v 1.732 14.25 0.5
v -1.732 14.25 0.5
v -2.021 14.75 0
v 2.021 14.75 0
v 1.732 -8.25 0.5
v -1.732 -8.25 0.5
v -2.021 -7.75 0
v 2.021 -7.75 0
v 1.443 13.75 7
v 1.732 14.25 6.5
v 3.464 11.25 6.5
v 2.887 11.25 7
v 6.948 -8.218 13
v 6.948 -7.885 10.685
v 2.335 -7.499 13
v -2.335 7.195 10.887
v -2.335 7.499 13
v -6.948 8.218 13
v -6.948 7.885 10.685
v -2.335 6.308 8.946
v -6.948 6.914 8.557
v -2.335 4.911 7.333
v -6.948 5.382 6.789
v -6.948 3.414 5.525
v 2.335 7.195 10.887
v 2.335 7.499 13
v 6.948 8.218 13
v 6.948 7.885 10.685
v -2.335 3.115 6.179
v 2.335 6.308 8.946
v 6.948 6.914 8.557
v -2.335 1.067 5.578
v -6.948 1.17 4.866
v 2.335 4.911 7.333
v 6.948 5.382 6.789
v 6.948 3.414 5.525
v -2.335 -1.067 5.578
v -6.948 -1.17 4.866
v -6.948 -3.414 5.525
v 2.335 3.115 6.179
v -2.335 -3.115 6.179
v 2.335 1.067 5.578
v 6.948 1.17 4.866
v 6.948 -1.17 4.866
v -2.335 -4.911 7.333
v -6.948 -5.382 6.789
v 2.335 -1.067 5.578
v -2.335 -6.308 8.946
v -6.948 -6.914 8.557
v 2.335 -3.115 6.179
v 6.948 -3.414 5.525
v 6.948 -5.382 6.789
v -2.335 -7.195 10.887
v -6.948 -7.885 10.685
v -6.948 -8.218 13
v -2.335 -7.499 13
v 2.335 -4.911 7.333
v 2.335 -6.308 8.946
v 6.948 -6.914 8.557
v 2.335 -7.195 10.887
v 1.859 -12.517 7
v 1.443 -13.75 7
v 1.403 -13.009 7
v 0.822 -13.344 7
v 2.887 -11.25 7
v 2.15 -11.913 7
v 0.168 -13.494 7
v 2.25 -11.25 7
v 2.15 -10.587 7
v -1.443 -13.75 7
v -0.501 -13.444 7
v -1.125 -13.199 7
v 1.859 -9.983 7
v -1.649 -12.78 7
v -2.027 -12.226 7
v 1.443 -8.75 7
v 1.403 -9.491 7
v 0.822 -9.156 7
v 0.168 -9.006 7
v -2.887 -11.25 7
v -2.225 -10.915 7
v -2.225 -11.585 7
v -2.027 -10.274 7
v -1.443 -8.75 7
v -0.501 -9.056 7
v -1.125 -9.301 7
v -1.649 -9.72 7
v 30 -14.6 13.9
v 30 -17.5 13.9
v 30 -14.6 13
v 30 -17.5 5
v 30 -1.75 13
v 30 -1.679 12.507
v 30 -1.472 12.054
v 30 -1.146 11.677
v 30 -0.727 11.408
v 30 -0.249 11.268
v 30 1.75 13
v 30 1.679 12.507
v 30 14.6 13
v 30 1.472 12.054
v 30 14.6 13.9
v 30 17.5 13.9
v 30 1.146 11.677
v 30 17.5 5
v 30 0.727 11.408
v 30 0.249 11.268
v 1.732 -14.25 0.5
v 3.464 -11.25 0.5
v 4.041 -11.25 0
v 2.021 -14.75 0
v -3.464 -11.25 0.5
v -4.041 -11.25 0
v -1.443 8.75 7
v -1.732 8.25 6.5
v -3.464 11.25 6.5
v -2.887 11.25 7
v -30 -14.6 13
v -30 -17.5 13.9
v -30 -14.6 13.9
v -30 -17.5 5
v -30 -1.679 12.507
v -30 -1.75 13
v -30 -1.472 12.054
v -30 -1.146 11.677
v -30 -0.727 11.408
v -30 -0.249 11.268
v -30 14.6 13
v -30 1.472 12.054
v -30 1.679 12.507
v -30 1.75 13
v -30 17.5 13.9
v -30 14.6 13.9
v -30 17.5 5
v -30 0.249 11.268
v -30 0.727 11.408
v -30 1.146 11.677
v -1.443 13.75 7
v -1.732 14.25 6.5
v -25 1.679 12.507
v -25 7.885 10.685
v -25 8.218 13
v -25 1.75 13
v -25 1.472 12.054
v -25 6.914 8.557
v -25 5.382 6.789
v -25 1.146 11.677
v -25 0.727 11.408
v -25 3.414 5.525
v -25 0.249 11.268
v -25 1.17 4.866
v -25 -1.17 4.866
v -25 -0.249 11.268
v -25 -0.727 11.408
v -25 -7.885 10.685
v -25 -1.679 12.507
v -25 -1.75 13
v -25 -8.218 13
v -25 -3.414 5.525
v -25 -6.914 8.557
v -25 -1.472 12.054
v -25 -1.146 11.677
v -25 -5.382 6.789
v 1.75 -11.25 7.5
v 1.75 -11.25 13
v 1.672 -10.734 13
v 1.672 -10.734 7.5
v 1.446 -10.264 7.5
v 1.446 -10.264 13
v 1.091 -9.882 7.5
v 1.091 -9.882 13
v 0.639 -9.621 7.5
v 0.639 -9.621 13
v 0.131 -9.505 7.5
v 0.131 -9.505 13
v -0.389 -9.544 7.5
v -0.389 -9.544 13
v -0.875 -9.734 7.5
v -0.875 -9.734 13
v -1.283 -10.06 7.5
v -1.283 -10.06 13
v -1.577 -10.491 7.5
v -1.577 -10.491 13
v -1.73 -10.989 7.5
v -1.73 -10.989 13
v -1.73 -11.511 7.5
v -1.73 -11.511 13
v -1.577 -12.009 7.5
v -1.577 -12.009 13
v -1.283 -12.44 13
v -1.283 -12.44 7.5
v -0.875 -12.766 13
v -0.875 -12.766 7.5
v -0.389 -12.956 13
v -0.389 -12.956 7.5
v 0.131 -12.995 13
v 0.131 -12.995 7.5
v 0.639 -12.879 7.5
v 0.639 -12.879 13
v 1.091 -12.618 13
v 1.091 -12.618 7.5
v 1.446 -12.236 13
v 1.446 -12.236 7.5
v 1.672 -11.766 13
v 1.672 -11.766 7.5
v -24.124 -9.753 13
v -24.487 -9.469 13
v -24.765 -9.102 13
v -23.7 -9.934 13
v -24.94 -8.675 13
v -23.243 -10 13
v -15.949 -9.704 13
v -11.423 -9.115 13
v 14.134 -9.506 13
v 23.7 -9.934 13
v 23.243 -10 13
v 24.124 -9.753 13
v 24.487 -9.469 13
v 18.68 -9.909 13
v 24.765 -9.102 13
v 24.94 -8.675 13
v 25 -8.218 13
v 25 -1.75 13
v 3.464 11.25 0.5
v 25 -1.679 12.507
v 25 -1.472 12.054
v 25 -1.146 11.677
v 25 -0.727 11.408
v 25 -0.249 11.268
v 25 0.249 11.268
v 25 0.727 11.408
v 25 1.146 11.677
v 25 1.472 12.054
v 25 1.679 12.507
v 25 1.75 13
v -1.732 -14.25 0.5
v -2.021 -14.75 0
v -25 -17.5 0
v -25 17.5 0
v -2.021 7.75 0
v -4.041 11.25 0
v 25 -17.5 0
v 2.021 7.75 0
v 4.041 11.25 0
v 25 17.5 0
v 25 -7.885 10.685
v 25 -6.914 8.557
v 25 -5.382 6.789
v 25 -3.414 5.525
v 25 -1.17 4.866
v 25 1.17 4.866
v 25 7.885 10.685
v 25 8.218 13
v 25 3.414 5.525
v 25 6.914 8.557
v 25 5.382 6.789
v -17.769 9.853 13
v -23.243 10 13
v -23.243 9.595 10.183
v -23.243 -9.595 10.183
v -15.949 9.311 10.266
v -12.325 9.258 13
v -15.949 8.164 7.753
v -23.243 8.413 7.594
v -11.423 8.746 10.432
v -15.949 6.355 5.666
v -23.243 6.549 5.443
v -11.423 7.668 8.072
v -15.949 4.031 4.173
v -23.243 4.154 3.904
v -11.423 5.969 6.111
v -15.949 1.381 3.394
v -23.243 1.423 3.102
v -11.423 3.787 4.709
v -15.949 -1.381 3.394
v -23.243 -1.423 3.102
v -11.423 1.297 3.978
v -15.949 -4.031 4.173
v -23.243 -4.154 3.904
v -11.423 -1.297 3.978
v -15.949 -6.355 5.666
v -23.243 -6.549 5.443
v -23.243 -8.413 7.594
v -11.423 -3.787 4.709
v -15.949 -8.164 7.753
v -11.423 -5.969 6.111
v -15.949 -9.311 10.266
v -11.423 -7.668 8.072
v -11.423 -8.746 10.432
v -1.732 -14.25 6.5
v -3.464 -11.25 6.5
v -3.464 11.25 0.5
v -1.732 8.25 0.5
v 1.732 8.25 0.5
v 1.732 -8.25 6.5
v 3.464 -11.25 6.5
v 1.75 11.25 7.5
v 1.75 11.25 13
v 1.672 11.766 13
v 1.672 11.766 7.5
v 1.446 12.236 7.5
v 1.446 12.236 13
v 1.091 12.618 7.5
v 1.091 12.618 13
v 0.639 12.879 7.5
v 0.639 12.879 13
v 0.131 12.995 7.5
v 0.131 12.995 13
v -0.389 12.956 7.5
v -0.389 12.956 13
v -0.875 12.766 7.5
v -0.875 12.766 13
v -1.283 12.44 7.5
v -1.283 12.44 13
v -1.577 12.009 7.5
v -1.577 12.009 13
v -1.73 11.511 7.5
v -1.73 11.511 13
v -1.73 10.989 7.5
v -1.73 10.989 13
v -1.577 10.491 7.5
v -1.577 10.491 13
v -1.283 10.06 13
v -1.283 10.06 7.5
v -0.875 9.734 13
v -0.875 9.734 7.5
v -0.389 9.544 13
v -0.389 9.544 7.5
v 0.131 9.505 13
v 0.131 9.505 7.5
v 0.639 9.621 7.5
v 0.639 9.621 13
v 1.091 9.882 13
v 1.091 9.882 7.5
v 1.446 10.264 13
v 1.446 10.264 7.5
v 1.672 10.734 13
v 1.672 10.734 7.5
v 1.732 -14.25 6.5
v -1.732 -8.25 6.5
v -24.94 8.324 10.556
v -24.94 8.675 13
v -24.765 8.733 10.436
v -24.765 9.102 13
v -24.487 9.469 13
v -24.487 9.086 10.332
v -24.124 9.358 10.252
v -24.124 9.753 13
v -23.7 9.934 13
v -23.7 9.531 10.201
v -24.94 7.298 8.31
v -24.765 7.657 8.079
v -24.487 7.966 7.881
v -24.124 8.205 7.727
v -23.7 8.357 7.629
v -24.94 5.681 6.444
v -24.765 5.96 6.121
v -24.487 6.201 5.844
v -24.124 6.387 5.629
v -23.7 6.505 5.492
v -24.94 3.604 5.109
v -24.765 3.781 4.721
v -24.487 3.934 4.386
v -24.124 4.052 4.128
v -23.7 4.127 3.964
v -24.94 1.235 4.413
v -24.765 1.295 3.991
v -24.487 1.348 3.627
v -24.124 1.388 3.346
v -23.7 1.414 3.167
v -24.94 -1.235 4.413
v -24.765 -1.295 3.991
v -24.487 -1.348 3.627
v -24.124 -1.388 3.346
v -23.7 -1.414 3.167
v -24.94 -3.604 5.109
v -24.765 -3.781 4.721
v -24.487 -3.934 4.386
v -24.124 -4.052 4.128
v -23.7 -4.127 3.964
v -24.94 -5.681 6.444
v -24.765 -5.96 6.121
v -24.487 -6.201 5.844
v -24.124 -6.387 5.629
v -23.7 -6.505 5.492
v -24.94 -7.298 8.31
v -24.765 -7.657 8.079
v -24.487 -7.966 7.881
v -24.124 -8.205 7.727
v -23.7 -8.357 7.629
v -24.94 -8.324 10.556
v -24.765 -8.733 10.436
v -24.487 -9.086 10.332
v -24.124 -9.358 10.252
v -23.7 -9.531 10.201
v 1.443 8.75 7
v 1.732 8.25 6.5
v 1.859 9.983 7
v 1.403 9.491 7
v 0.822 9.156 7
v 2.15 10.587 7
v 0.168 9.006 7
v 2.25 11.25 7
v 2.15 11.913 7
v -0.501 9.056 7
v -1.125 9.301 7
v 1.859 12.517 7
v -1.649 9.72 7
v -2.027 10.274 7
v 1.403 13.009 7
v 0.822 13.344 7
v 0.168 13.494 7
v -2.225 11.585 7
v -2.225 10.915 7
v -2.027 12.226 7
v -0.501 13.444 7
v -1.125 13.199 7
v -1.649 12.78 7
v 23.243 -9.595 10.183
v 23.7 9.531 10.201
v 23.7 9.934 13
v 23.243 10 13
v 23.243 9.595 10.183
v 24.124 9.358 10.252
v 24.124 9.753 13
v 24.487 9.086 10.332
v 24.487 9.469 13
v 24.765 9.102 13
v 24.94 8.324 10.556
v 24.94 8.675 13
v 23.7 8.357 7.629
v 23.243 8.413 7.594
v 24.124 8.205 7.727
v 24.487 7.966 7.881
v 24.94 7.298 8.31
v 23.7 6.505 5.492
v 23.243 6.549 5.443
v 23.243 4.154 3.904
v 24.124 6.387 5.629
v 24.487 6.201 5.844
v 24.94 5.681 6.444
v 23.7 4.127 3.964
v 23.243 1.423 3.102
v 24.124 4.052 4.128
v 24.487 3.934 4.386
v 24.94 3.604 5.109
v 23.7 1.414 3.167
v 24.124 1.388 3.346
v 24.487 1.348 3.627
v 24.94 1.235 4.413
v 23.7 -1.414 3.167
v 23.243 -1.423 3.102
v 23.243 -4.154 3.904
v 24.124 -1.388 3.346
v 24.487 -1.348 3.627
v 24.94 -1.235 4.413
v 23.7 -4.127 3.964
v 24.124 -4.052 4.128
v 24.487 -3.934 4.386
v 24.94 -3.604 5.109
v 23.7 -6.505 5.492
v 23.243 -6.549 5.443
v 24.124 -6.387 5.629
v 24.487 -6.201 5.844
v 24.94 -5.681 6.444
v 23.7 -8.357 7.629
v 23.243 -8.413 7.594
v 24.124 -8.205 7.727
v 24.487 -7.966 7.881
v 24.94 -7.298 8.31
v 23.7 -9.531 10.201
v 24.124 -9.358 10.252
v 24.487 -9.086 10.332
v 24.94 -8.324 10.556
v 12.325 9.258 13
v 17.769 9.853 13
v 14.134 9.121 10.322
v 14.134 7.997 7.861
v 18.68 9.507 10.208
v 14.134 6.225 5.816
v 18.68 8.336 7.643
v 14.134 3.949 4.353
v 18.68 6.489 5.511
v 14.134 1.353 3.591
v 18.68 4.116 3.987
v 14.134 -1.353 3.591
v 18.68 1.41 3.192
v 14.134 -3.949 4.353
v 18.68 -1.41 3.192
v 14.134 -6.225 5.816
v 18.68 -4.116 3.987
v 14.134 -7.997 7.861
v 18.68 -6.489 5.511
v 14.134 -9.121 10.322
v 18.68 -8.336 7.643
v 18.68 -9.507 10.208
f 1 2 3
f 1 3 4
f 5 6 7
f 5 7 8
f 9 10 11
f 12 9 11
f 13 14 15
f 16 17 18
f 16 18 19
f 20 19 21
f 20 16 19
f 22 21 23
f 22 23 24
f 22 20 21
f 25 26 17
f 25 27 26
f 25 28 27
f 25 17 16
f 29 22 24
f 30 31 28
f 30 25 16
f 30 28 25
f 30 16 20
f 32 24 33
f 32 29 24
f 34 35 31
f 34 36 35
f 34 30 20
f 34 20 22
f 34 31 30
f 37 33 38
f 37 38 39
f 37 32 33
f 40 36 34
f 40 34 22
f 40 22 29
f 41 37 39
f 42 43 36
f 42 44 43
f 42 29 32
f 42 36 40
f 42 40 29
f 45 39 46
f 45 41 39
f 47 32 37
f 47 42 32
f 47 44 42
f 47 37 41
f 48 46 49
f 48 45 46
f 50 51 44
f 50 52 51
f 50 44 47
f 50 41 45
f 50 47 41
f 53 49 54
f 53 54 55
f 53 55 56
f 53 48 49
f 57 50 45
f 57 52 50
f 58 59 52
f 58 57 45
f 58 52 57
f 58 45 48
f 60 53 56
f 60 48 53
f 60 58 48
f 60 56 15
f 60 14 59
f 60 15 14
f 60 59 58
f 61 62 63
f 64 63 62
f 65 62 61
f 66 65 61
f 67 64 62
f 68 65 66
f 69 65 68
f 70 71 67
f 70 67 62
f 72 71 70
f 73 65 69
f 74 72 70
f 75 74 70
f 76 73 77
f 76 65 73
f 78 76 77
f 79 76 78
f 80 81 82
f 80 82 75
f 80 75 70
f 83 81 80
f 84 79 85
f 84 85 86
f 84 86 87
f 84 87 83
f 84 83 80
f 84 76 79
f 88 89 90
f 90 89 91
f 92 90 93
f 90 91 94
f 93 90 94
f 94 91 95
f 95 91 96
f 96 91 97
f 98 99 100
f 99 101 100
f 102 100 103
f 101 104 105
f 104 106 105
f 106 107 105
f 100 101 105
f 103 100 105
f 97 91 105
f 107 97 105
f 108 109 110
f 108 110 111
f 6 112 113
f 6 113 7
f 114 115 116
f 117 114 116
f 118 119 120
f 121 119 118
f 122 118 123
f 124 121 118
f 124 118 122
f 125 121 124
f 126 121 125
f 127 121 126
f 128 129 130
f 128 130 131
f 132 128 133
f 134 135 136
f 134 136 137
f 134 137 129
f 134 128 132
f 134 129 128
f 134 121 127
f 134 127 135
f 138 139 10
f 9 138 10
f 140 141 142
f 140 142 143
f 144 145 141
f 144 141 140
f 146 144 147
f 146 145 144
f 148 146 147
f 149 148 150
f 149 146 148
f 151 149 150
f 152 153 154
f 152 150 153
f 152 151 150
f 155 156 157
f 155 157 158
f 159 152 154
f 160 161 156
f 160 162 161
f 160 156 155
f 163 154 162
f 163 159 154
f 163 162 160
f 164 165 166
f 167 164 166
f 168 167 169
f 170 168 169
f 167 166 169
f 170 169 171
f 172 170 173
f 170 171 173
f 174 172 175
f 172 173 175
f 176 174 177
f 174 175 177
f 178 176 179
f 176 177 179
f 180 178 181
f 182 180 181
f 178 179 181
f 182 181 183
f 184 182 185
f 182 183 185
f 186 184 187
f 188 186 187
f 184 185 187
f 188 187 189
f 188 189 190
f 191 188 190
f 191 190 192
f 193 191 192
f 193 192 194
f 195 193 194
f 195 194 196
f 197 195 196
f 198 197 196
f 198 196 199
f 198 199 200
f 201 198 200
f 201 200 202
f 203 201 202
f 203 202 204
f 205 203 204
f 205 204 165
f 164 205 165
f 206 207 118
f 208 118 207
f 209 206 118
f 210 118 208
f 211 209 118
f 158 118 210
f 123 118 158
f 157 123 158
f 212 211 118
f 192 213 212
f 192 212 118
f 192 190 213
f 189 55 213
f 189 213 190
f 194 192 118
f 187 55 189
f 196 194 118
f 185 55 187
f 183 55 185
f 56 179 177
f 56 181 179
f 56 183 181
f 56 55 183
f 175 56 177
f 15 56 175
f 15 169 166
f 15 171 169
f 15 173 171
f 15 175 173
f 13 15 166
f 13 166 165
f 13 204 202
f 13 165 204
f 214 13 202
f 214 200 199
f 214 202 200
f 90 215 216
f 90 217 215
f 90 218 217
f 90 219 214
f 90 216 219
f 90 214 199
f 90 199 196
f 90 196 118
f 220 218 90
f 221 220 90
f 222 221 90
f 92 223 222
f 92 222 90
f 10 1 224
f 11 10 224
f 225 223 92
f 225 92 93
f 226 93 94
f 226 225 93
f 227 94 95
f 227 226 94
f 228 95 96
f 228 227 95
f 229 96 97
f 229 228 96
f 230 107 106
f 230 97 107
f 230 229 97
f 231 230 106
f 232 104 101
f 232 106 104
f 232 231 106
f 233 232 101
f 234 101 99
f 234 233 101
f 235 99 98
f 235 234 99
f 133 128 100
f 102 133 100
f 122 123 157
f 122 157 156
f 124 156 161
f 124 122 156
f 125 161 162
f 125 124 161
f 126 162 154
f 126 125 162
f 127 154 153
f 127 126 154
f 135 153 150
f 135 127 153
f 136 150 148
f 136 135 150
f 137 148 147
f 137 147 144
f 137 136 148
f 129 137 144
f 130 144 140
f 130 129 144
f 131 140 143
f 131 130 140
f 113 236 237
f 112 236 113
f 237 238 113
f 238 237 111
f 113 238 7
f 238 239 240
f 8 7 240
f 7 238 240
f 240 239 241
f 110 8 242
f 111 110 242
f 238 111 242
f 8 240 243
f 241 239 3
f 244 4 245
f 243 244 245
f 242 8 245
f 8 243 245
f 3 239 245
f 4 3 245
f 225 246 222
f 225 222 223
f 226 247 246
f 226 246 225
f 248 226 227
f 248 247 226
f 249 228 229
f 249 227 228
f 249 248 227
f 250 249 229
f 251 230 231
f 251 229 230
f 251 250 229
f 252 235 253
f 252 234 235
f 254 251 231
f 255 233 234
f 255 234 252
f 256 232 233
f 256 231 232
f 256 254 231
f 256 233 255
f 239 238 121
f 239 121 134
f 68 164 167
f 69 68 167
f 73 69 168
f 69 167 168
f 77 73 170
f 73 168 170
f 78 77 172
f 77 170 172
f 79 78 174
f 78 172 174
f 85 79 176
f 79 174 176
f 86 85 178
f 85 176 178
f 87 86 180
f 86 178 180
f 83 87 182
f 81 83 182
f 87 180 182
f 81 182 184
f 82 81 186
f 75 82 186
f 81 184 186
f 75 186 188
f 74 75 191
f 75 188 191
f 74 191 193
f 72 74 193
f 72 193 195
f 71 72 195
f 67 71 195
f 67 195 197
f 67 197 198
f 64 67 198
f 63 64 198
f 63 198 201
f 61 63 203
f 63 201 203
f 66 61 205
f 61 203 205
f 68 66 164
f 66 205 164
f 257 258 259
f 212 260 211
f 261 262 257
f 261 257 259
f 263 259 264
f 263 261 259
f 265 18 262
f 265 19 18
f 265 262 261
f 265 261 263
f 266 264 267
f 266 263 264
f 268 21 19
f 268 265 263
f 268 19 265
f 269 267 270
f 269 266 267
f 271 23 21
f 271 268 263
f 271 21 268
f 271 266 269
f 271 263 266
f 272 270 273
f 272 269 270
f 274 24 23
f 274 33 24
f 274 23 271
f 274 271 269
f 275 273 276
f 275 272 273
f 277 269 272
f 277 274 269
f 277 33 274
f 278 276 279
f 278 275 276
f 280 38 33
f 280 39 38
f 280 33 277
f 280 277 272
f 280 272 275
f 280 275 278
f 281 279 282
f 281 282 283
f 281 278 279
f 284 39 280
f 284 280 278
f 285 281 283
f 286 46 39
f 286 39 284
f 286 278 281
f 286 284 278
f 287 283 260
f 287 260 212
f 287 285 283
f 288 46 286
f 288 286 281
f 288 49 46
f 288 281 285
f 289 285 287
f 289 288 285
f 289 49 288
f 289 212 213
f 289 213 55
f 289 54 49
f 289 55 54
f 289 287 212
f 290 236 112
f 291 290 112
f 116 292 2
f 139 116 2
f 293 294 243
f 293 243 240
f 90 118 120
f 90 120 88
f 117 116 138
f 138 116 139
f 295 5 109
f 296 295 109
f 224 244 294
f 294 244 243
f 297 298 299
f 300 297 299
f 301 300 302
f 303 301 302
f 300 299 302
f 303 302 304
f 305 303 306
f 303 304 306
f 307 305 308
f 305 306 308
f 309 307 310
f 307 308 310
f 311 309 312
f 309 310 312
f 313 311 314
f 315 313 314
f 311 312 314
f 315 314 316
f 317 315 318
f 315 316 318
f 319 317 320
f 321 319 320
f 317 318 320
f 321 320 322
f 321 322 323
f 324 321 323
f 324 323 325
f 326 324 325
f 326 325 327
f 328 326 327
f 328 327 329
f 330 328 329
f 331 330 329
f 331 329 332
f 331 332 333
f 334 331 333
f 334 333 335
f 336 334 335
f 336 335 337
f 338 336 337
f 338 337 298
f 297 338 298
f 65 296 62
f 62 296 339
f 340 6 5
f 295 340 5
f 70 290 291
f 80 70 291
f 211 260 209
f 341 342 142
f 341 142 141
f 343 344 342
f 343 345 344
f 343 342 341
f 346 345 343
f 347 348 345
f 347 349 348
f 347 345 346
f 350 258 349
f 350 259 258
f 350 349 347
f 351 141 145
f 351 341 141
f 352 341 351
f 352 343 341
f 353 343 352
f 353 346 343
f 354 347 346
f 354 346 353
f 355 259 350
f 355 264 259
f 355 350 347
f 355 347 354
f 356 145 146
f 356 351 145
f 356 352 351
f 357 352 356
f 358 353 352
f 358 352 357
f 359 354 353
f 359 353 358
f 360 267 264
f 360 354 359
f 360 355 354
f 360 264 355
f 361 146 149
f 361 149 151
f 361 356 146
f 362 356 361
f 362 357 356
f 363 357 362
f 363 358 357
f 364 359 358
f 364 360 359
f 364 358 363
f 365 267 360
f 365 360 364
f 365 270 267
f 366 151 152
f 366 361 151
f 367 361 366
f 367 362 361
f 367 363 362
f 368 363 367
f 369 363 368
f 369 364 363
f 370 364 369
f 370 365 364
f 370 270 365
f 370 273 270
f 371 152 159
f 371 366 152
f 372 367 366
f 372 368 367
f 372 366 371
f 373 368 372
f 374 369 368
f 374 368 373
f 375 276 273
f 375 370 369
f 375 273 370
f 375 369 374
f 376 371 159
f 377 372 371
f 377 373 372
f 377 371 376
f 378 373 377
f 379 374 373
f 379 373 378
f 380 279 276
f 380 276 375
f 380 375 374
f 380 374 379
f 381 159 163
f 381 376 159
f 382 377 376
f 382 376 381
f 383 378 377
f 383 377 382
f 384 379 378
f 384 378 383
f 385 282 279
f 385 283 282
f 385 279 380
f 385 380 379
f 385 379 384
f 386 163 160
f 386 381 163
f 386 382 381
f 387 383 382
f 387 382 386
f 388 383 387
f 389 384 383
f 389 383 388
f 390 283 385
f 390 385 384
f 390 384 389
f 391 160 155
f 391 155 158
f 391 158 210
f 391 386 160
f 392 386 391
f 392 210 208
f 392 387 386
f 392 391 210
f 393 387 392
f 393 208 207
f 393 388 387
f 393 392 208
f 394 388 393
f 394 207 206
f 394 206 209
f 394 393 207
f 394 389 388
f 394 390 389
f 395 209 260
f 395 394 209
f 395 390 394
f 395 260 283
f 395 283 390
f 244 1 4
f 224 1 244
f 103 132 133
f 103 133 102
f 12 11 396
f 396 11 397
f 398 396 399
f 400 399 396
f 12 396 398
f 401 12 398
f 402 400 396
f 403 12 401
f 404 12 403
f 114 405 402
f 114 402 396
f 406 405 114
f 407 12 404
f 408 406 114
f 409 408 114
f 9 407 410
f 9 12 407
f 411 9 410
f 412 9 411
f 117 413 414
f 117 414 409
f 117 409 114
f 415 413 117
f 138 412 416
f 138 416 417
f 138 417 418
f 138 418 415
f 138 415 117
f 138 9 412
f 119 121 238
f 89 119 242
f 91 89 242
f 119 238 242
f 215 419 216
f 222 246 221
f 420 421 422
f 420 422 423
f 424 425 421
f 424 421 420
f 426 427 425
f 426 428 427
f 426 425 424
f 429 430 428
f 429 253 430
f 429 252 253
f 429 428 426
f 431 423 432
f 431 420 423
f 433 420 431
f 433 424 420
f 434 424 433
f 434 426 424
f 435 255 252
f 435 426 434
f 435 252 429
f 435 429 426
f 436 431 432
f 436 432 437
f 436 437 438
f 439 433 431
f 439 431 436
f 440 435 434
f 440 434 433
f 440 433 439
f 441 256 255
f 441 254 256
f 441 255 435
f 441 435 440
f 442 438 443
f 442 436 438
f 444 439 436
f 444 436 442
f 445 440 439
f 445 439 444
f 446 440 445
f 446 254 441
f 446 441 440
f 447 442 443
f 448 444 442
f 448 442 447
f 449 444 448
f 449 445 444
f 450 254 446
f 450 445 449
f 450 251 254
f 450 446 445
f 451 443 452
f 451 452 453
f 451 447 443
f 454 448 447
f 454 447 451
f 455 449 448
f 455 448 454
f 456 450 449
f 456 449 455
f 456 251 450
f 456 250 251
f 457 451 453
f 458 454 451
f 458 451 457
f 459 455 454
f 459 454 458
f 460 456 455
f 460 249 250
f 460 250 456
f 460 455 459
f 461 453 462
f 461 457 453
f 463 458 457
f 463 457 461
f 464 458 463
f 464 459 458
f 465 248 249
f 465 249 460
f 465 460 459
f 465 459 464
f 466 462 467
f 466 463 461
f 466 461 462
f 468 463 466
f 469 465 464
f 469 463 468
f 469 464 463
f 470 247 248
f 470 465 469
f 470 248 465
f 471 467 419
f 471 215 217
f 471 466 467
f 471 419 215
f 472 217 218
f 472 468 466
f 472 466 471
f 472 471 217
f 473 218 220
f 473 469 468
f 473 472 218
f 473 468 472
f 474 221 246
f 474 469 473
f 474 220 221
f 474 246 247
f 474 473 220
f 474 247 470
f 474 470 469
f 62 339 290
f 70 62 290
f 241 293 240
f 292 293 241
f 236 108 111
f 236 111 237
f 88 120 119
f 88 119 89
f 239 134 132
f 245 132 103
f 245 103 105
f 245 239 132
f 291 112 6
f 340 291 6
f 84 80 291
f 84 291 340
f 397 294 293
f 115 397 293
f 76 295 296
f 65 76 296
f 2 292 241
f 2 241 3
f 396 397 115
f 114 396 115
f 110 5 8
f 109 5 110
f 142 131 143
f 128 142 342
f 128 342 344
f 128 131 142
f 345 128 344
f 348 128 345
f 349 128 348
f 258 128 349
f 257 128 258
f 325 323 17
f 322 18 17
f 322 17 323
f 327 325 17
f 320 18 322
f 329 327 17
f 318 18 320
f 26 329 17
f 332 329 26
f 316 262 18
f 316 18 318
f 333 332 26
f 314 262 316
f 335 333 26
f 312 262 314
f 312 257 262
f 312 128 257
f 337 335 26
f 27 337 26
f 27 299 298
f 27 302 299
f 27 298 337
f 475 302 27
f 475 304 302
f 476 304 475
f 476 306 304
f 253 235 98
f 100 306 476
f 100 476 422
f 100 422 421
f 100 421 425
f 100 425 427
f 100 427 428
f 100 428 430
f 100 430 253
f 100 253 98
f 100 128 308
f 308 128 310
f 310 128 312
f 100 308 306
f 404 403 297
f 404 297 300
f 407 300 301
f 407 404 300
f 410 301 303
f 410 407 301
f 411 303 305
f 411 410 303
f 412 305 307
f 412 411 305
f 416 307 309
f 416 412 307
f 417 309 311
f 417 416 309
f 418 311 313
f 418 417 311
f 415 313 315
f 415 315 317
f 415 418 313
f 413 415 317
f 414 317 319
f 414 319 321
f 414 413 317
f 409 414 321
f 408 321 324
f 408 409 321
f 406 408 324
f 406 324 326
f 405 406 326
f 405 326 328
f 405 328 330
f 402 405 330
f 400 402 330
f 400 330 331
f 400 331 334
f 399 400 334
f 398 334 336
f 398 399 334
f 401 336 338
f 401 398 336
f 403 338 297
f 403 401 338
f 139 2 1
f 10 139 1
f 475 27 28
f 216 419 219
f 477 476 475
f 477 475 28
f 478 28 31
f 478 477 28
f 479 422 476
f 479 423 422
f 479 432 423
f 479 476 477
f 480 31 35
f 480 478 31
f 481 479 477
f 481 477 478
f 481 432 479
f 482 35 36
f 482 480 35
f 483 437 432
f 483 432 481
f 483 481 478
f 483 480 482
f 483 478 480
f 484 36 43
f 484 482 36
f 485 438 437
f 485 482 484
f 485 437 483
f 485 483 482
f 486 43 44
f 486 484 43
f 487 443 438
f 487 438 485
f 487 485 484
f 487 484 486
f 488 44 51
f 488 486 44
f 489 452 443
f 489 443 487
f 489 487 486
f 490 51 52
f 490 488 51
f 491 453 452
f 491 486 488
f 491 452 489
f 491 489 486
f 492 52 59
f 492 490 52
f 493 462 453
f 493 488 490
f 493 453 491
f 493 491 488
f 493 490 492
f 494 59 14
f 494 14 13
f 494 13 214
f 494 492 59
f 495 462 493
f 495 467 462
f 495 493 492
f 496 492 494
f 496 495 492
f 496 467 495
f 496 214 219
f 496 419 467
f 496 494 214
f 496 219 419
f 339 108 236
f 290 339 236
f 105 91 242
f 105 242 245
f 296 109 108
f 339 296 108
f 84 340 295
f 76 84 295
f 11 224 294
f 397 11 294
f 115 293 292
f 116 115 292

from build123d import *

# Parameters (mm, degrees)
SKETCH1_W               = 60
SKETCH1_H               = 35
BOSS_EXTRUDE1_DEPTH     = 13
CUT_EXTRUDE1_DEPTH      = 64.837684937
CUT_EXTRUDE1_DEPTH_BACK = 64.837684937
SKETCH3_R               = 1.75
SKETCH5_R               = 1.75
CUT_EXTRUDE3_DEPTH      = 38.08436341
CHAMFER1_SIZE           = 5
CUT_EXTRUDE4_DEPTH      = 7
SKETCH4_W               = 60
SKETCH4_H               = 2.9
BOSS_EXTRUDE2_DEPTH     = 0.9
CHAMFER2_SIZE           = 0.5


with BuildPart() as part:
    # Sketch1 → Boss-Extrude1 (new body)
    with BuildSketch(Plane.XY):
        Rectangle(SKETCH1_W, SKETCH1_H)
    extrude(amount=BOSS_EXTRUDE1_DEPTH)

    # Sketch2 → Cut-Revolve1 (revolve, cut)
    with BuildSketch(Plane.XY.offset(13)):
        with BuildLine():
            Line((-25, 0), (-25, 8.218127455))
            ThreePointArc((-25, 8.218127455), (-24.486963528, 9.469250598), (-23.243251097, 10))
            ThreePointArc((-23.243251097, 10), (-15.040879193, 9.611248064), (-6.94833646, 8.218127455))
            ThreePointArc((-6.94833646, 8.218127455), (0, 7.408356031), (6.94833646, 8.218127455))
            ThreePointArc((6.94833646, 8.218127455), (15.040879193, 9.611248064), (23.243251097, 10))
            ThreePointArc((23.243251097, 10), (24.486963528, 9.469250598), (25, 8.218127455))
            Line((25, 8.218127455), (25, 0))
            Line((25, 0), (-25, 0))
        make_face()
    revolve(axis=Axis((25, 0, 13), (-1, 0, 0)), mode=Mode.SUBTRACT)

    # Sketch3 → Cut-Extrude1 (cut, two sides: drawn at the far end of the back side and taken through both)
    with BuildSketch(Plane(origin=(30, 0, 0), x_dir=(0, 0, -1), z_dir=(1, 0, 0)).offset(-CUT_EXTRUDE1_DEPTH_BACK)):
        with Locations((-13, 0)):
            Circle(SKETCH3_R)
    extrude(amount=CUT_EXTRUDE1_DEPTH + CUT_EXTRUDE1_DEPTH_BACK, mode=Mode.SUBTRACT)

    # Sketch5 → Cut-Extrude3 (cut, through all)
    with BuildSketch(Plane.XY.offset(13)):
        with Locations((0, 11.25)):
            Circle(SKETCH5_R)
        with Locations((0, -11.25)):
            Circle(SKETCH5_R)
    extrude(amount=-CUT_EXTRUDE3_DEPTH, mode=Mode.SUBTRACT)

    # Chamfer1
    chamfer1_edges = [part.edges().sort_by_distance(p)[0] for p in [
        (-30, 0, 0),
        (30, 0, 0),
    ]]
    chamfer(chamfer1_edges, length=CHAMFER1_SIZE)

    # Sketch6 → Cut-Extrude4 (cut)
    with BuildSketch(Plane(origin=(0, 0, 0), x_dir=(-1, 0, 0), z_dir=(0, 0, -1))):
        Polygon((3.464101615, 11.25), (1.732050808, 14.25), (-1.732050808, 14.25), (-3.464101615, 11.25), (-1.732050808, 8.25), (1.732050808, 8.25), align=None)
        Polygon((3.464101615, -11.25), (1.732050808, -8.25), (-1.732050808, -8.25), (-3.464101615, -11.25), (-1.732050808, -14.25), (1.732050808, -14.25), align=None)
    extrude(amount=-CUT_EXTRUDE4_DEPTH, mode=Mode.SUBTRACT)

    # Sketch4 → Boss-Extrude2 (add)
    with BuildSketch(Plane.XY.offset(13)):
        with Locations((0, 16.05)):
            Rectangle(SKETCH4_W, SKETCH4_H)
        with Locations((0, -16.05)):
            Rectangle(SKETCH4_W, SKETCH4_H)
    extrude(amount=BOSS_EXTRUDE2_DEPTH)

    # Chamfer2
    chamfer2_edges = [part.edges().sort_by_distance(p)[0] for p in [
        (-2.598076211, 9.75, 0),
        (-2.598076211, 12.75, 0),
        (0, 14.25, 0),
        (2.598076211, 12.75, 0),
        (2.598076211, 9.75, 0),
        (0, 8.25, 0),
        (-2.598076211, 9.75, 7),
        (0, 8.25, 7),
        (2.598076211, 9.75, 7),
        (2.598076211, 12.75, 7),
        (0, 14.25, 7),
        (-2.598076211, 12.75, 7),
        (-1.75, 11.25, 7),
        (-2.598076211, -12.75, 0),
        (-2.598076211, -9.75, 0),
        (0, -8.25, 0),
        (2.598076211, -9.75, 0),
        (2.598076211, -12.75, 0),
        (0, -14.25, 0),
        (-2.598076211, -12.75, 7),
        (0, -14.25, 7),
        (2.598076211, -12.75, 7),
        (2.598076211, -9.75, 7),
        (0, -8.25, 7),
        (-2.598076211, -9.75, 7),
        (-1.75, -11.25, 7),
    ]]
    chamfer(chamfer2_edges, length=CHAMFER2_SIZE)


solid = part.part
